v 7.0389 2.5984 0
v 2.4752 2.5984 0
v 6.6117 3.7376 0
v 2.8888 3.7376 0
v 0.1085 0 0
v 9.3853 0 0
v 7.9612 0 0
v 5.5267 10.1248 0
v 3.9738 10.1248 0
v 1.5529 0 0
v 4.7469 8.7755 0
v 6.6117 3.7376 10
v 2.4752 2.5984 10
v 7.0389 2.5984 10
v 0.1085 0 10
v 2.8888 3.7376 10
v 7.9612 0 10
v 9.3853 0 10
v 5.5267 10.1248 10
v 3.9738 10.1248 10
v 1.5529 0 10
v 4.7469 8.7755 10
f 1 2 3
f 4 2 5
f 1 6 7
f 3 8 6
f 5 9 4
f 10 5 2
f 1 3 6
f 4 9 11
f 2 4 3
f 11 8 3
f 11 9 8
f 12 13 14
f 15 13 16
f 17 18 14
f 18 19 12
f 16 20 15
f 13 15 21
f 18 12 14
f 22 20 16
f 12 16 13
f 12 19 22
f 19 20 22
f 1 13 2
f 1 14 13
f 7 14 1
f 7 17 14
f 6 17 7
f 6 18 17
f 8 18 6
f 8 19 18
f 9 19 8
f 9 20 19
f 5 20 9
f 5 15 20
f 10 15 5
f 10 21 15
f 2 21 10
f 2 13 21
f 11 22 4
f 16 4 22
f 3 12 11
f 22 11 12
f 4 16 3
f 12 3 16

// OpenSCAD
// Generated by SolidPython 1.1.3 on 2025-02-16 19:45:43


linear_extrude(height = 10) {
	text(font = "Ariel", size = 10, text = "A");
}
/***********************************************
*********      SolidPython code:      **********
************************************************
 
from solid import *
from solid.utils import *
import subprocess

def letter_3d(letter, size, font):
    letter_2d = text(text=letter, size=size, font=font)

    letter_3d = linear_extrude(height=size)(letter_2d)

    return letter_3d

def intersection_3d(letter1, letter2, size, font):
    letter1_3d = letter_3d(letter1, size, font)
    letter2_3d = letter_3d(letter2, size, font)

    letter2_3d = rotate(a=90, v=[1,0,0])(letter2_3d)

    intersect = intersection()(letter1_3d, letter2_3d)

    return intersect



if __name__ == "__main__":
    # shape = intersection_3d("A", "B", 10, "Arial")
    shapeA = letter_3d("A", 10, "Ariel")
    scad_render_to_file(shapeA, 'A.scad')

    shapeB = letter_3d("B", 10, "Ariel")
    shapeB = rotate(a=90, v=[1,0,0])(shapeB)

    final = intersection()(shapeA, shapeB)

    
    scad_render_to_file(final, "final.scad")

    # subprocess.run(["C:\\Program Files\\OpenSCAD\\openscad.exe", "-o", "A.stl", "A.scad"])
    # subprocess.run(["C:\\Program Files\\OpenSCAD\\openscad.exe", "-o", "B.stl", "B.scad"])

    subprocess.run(["C:\\Program Files\\OpenSCAD\\openscad.exe", "-o", "final.stl", "final.scad"])

 
 
************************************************/
